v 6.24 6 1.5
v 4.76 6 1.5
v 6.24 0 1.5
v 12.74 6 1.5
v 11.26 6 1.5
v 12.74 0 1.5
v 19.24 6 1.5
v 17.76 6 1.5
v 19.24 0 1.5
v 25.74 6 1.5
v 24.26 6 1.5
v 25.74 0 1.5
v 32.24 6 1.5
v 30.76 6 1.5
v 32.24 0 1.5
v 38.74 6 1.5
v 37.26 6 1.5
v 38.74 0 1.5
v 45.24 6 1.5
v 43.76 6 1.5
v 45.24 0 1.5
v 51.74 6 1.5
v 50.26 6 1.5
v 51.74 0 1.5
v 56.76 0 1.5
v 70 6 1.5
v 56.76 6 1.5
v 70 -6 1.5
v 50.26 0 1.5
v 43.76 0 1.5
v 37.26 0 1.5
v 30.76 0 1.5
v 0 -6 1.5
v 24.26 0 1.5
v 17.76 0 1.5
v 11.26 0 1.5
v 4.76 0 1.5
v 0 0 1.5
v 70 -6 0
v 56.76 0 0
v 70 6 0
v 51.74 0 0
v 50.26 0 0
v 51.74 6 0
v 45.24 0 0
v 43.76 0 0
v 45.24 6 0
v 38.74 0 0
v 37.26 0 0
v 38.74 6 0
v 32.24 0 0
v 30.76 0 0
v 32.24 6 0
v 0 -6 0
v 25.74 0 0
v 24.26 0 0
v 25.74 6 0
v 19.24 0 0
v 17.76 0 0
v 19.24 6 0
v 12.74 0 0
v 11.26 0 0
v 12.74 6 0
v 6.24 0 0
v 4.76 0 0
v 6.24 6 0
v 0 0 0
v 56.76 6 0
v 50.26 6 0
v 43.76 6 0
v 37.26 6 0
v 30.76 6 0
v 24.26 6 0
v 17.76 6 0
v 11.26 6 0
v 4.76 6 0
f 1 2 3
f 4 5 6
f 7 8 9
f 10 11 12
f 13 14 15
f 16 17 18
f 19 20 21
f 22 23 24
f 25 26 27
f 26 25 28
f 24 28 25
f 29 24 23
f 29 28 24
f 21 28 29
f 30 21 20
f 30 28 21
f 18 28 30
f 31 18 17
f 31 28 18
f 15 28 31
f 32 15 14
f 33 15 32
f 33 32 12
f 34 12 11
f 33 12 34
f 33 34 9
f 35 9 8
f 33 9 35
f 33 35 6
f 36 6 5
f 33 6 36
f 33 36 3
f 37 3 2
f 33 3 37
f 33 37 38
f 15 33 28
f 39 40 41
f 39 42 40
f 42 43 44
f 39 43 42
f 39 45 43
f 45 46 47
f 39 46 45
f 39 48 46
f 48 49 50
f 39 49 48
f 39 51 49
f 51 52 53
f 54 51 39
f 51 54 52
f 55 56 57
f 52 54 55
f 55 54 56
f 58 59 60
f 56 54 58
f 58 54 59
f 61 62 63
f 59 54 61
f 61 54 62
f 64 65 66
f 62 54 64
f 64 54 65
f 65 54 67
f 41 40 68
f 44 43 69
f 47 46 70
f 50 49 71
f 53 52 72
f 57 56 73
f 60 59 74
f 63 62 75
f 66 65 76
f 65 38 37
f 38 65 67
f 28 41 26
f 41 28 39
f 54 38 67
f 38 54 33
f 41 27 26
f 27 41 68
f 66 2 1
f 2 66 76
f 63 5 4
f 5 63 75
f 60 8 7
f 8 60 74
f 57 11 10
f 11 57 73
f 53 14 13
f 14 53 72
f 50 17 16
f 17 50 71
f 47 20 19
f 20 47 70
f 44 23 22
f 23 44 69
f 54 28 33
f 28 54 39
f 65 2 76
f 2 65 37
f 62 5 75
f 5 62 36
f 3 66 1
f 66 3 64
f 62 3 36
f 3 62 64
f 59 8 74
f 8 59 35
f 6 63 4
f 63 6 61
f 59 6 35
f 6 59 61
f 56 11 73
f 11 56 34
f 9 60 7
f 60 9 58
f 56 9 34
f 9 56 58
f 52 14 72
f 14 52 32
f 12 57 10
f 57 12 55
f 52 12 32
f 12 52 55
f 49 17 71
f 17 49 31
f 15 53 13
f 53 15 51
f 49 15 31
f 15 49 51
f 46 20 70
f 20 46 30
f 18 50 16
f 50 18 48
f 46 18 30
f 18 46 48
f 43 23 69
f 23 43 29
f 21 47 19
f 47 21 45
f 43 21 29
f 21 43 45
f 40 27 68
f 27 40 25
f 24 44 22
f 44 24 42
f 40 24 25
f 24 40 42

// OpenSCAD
// 10-well comb for agarose gel casting, printed lying flat
// Units: mm

$fn = 64;

// Spine (back bar)
spine_len   = 70;   // length along X
spine_wid   = 12;   // width along Y

// Teeth
tooth_count = 10;   // number of teeth
tooth_w     = 5.0;  // tooth width along X
tooth_l     = 12;   // tooth length along Y (hangs in -Y)
tooth_pitch = 1.5;  // gap between neighbouring teeth along X

// Plate
plate_t = 1.5;      // plate thickness along Z

// Derived
g = tooth_w + tooth_pitch;  // centre-to-centre spacing along X
x0 = -(tooth_count - 1) * tooth_pitch / 2;  // first tooth X position (row centred)

difference() {
    union() {
        // Spine
        translate([0, -spine_wid / 2, 0])
            cube([spine_len, spine_wid, plate_t]);

        // Teeth
        for (i = [0 : tooth_count - 1])
            translate([x0 + i * g, 0, 0])
                cube([tooth_w, tooth_l, plate_t]);
    }

    // Overlap the teeth into the spine so the union is one solid
    for (i = [0 : tooth_count - 1])
        translate([x0 + i * g - 0.01, 0, -1])
            cube([tooth_w + 0.02, tooth_l + 1, plate_t + 2]);
}
